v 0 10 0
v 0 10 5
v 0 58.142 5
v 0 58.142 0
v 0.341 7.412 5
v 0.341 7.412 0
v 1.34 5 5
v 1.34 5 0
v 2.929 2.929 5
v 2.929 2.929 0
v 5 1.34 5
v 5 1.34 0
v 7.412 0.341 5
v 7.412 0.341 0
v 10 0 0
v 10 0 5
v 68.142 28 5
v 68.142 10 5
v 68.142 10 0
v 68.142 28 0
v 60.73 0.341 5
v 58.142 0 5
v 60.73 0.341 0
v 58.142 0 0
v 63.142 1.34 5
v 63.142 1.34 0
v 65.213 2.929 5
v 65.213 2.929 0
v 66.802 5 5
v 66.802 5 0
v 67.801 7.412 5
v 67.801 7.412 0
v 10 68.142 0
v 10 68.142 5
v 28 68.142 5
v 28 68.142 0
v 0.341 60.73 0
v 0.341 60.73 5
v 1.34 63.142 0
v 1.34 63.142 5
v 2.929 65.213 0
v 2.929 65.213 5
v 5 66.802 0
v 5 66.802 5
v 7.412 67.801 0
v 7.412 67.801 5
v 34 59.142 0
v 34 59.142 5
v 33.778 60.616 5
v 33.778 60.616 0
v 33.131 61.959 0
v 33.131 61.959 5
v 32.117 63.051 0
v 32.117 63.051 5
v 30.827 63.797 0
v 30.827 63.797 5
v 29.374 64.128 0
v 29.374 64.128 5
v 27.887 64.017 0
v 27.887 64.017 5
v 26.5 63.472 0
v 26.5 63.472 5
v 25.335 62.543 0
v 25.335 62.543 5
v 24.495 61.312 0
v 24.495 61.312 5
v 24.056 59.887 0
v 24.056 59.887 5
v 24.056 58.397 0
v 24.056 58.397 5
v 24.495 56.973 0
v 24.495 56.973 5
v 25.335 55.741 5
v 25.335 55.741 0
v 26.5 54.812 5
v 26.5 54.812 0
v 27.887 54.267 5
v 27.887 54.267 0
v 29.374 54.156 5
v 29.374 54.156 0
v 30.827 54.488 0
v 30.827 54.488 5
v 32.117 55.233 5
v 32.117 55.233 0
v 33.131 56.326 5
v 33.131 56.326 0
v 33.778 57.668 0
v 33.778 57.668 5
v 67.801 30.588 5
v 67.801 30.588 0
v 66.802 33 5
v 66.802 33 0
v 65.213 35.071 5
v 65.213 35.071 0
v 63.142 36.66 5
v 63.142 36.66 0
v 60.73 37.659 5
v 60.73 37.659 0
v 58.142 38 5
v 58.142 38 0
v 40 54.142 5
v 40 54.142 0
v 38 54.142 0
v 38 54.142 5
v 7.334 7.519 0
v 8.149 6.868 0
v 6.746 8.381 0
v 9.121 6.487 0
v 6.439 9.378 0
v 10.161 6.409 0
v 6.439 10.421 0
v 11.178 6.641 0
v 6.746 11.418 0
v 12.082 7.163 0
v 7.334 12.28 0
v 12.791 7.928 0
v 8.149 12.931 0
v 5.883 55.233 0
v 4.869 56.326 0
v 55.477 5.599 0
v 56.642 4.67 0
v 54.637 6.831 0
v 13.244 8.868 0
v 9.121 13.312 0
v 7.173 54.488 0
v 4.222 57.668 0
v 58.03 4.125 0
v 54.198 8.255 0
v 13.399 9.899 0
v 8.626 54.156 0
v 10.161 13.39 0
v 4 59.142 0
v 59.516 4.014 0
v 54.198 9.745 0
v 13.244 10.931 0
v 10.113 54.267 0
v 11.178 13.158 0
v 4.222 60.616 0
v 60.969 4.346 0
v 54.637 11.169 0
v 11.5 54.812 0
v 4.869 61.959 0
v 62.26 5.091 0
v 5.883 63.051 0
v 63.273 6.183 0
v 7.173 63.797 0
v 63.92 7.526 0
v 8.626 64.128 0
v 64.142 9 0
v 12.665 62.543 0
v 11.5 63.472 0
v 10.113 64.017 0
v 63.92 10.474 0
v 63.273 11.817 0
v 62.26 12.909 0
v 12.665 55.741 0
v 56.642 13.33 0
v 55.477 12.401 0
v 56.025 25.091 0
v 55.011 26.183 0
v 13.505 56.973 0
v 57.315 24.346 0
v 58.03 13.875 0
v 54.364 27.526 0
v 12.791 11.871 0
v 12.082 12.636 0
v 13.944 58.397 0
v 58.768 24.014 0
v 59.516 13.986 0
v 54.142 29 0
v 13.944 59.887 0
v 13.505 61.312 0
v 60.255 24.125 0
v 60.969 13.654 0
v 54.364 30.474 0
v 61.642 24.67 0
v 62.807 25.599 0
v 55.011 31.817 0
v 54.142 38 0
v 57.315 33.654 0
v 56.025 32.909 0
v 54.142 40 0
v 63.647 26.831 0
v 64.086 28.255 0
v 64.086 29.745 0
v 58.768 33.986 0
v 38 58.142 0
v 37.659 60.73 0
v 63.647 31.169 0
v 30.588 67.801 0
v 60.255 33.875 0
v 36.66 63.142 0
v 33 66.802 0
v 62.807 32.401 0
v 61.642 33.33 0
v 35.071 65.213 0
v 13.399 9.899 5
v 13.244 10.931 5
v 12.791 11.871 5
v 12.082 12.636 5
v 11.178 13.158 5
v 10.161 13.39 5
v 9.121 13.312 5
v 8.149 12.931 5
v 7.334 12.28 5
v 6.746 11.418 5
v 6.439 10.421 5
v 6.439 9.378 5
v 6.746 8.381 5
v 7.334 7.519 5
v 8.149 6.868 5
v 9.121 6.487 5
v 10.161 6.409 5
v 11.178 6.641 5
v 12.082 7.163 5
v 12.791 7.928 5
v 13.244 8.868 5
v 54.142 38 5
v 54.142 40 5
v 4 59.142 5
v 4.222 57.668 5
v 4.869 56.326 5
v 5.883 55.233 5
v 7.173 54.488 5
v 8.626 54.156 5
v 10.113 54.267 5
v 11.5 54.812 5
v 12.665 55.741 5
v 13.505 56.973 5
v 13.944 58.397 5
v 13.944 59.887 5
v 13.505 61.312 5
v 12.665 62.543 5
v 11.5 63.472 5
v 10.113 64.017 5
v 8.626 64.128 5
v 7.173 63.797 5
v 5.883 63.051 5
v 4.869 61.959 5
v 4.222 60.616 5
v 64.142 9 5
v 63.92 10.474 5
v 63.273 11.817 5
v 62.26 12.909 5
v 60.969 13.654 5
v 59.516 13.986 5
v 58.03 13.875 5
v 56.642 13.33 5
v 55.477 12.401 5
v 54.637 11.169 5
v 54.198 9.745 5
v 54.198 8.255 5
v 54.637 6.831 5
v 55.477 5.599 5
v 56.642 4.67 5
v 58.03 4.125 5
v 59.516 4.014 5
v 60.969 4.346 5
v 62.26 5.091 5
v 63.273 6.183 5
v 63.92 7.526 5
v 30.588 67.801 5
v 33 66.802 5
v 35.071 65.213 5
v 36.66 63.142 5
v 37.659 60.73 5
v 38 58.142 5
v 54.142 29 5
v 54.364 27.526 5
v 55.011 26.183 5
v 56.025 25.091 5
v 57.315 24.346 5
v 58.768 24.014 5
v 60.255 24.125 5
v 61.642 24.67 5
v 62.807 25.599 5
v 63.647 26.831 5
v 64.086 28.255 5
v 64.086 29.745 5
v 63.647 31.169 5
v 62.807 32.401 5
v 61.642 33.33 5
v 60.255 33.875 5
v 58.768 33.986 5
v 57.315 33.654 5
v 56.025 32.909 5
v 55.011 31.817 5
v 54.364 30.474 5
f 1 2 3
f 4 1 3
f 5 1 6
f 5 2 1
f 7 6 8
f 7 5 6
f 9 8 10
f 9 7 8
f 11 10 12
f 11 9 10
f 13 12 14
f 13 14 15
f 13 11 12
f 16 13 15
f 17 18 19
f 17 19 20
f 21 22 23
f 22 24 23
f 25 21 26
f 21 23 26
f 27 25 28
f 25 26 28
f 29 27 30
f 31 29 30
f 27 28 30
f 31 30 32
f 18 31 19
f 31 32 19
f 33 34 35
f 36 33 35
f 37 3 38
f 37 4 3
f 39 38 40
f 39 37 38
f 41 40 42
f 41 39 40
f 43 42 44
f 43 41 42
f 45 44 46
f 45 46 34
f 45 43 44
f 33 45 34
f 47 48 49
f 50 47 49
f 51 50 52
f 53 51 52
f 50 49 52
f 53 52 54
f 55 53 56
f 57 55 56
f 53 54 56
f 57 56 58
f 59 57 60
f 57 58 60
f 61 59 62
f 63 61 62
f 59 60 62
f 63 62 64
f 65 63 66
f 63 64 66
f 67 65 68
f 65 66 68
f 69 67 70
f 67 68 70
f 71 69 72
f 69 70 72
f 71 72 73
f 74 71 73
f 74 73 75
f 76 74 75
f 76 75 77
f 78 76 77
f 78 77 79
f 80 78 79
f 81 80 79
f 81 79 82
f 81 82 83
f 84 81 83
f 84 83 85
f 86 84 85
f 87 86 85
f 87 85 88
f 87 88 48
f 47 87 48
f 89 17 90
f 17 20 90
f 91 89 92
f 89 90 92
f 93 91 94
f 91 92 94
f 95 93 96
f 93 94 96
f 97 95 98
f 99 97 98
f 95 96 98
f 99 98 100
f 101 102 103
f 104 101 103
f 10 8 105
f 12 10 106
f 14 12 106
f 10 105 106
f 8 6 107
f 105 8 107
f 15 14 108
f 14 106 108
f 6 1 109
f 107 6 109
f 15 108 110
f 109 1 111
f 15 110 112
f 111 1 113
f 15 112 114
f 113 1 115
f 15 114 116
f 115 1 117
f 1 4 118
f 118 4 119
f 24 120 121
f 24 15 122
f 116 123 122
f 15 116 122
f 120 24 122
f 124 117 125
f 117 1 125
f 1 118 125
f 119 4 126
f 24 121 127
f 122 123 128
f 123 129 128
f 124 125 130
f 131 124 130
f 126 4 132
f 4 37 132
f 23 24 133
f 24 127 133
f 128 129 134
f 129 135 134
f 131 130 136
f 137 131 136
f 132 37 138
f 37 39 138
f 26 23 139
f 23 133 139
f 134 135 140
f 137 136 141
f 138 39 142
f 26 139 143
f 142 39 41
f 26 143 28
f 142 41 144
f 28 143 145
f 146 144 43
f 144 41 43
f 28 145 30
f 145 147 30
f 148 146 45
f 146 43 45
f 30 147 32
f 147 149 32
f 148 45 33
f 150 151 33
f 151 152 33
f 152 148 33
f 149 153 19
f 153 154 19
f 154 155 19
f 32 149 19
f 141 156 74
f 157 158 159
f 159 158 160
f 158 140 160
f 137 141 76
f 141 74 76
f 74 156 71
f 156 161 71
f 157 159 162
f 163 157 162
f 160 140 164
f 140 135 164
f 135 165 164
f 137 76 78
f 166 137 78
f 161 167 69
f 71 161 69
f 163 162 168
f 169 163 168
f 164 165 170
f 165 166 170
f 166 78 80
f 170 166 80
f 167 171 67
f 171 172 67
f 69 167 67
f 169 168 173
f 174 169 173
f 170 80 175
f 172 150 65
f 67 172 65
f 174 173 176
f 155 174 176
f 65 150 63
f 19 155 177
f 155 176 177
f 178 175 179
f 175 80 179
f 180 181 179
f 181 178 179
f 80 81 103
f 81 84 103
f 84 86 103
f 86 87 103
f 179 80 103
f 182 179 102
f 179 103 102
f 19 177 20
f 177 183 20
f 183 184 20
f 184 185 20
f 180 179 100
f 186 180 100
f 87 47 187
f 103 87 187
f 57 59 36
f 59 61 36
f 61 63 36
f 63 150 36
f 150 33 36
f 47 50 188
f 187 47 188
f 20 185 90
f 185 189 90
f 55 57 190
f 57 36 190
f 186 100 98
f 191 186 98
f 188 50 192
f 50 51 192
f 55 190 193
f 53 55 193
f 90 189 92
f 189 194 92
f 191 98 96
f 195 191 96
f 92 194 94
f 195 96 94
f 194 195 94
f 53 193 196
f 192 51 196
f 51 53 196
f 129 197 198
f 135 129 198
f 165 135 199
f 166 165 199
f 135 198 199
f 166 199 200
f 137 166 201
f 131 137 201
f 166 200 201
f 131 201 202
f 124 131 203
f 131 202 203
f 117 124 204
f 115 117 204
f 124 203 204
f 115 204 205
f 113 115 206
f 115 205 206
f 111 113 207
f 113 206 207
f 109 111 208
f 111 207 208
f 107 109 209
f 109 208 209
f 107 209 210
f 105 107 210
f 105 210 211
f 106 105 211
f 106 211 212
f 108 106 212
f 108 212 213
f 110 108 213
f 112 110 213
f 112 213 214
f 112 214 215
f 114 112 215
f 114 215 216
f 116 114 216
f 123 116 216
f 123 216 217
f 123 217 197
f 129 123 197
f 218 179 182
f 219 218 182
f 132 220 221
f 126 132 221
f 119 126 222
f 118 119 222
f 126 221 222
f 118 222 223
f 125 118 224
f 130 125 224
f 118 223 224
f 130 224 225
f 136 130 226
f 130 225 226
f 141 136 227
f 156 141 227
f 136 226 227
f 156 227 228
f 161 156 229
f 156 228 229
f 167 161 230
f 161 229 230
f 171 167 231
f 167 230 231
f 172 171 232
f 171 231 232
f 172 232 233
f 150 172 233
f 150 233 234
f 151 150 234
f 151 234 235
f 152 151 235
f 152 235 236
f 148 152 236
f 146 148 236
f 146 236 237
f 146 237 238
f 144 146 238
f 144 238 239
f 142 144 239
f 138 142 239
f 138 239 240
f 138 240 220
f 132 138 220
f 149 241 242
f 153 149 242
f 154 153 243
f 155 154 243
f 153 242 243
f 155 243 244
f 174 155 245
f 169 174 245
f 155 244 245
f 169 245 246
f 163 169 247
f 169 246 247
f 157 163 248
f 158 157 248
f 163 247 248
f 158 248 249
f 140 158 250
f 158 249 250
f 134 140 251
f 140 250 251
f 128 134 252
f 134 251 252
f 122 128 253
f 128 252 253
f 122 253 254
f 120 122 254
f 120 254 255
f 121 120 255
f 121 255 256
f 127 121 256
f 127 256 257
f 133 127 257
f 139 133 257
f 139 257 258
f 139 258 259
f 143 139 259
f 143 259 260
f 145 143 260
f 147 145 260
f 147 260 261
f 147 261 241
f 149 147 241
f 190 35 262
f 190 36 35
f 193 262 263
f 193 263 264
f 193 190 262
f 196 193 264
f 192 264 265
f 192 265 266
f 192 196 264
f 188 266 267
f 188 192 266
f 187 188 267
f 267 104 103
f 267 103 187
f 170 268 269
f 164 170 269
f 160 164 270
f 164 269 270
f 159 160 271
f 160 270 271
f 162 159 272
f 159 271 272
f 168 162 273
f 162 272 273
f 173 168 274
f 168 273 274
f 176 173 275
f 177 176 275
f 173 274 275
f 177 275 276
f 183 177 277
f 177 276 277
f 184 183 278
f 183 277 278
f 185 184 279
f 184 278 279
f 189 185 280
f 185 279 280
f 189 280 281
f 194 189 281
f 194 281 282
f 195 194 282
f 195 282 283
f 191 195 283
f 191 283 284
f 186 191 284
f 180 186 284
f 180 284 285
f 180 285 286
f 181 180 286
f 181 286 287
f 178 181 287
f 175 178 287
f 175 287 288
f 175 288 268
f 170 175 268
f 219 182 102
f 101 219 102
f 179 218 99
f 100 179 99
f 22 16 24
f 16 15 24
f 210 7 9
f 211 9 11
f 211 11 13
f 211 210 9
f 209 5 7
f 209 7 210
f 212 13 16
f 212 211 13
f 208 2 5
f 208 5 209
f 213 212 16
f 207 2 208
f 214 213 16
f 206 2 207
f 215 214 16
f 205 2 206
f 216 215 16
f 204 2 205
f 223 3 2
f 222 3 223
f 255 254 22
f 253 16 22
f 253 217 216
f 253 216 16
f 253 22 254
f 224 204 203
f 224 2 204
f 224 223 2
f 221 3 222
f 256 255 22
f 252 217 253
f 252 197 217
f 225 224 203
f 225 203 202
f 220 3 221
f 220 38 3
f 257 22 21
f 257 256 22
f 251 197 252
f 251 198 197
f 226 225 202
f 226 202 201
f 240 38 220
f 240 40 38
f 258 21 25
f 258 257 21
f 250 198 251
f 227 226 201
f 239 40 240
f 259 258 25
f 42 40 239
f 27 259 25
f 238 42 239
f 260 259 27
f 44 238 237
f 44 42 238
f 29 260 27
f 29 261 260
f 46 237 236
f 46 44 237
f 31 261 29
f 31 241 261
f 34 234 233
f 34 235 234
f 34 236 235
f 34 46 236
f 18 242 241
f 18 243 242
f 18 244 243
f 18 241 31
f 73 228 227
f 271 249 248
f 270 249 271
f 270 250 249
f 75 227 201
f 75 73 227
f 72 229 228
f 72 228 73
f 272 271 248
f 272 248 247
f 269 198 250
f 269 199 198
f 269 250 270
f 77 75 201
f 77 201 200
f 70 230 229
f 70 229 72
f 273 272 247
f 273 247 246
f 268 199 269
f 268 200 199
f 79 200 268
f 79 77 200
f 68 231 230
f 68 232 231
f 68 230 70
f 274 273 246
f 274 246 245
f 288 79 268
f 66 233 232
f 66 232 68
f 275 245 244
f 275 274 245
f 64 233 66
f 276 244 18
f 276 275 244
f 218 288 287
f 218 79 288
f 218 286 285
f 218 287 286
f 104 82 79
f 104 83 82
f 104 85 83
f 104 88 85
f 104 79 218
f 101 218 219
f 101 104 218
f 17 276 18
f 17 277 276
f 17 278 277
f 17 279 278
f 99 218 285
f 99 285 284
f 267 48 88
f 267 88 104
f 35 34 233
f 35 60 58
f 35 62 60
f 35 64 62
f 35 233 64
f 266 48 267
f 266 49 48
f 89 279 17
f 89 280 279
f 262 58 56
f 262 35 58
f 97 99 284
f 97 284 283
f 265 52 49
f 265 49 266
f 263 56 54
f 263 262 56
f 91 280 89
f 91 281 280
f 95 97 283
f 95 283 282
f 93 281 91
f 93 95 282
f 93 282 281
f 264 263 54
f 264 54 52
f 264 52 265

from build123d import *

# Parameters (mm, degrees)
BOSS_EXTRU_1_DEPTH      = 5
ESQUISSE3_W             = 38
ESQUISSE3_H             = 14
ESQUISSE3_W_2           = 14
ESQUISSE3_H_2           = 38
BOSS_EXTRU_2_DEPTH      = 5
ESQUISSE4_R             = 5
ESQUISSE4_R_2           = 3.5
ENL_V_MAT_EXTRU_2_DEPTH = 97.497156926
CONG_1_R                = 10


with BuildPart() as part:
    # Esquisse1 → Boss.-Extru.1 (new body)
    with BuildSketch(Plane.XY):
        Polygon((0, 0), (54.142135624, 0), (54.142135624, 40), (40, 54.142135624), (0, 54.142135624), align=None)
    extrude(amount=BOSS_EXTRU_1_DEPTH)

    # Esquisse3 → Boss.-Extru.2 (add)
    with BuildSketch(Plane.XY.offset(5)):
        with Locations((19, 61.142135624)):
            Rectangle(ESQUISSE3_W, ESQUISSE3_H)
        with Locations((61.142135624, 19)):
            Rectangle(ESQUISSE3_W_2, ESQUISSE3_H_2)
    extrude(amount=-BOSS_EXTRU_2_DEPTH)

    # Esquisse4 → Enlèv. mat.-Extru.2 (cut, through all)
    with BuildSketch(Plane.XY.offset(5)):
        with Locations((29, 59.142135624)):
            Circle(ESQUISSE4_R)
        with Locations(Location((9, 59.142135624, 0), (0, 0, 180))):
            Circle(ESQUISSE4_R)
        with Locations((59.142135624, 9)):
            Circle(ESQUISSE4_R)
        with Locations(Location((59.142135624, 29, 0), (0, 0, 180))):
            Circle(ESQUISSE4_R)
        with Locations((9.899494937, 9.899494937)):
            Circle(ESQUISSE4_R_2)
    extrude(amount=-ENL_V_MAT_EXTRU_2_DEPTH, mode=Mode.SUBTRACT)

    # Congé1
    cong_1_edges = [part.edges().sort_by_distance(p)[0] for p in [
        (0, 68.142135624, 2.5),
        (38, 68.142135624, 2.5),
        (68.142135624, 38, 2.5),
        (68.142135624, 0, 2.5),
        (0, 0, 2.5),
    ]]
    fillet(cong_1_edges, radius=CONG_1_R)


solid = part.part
